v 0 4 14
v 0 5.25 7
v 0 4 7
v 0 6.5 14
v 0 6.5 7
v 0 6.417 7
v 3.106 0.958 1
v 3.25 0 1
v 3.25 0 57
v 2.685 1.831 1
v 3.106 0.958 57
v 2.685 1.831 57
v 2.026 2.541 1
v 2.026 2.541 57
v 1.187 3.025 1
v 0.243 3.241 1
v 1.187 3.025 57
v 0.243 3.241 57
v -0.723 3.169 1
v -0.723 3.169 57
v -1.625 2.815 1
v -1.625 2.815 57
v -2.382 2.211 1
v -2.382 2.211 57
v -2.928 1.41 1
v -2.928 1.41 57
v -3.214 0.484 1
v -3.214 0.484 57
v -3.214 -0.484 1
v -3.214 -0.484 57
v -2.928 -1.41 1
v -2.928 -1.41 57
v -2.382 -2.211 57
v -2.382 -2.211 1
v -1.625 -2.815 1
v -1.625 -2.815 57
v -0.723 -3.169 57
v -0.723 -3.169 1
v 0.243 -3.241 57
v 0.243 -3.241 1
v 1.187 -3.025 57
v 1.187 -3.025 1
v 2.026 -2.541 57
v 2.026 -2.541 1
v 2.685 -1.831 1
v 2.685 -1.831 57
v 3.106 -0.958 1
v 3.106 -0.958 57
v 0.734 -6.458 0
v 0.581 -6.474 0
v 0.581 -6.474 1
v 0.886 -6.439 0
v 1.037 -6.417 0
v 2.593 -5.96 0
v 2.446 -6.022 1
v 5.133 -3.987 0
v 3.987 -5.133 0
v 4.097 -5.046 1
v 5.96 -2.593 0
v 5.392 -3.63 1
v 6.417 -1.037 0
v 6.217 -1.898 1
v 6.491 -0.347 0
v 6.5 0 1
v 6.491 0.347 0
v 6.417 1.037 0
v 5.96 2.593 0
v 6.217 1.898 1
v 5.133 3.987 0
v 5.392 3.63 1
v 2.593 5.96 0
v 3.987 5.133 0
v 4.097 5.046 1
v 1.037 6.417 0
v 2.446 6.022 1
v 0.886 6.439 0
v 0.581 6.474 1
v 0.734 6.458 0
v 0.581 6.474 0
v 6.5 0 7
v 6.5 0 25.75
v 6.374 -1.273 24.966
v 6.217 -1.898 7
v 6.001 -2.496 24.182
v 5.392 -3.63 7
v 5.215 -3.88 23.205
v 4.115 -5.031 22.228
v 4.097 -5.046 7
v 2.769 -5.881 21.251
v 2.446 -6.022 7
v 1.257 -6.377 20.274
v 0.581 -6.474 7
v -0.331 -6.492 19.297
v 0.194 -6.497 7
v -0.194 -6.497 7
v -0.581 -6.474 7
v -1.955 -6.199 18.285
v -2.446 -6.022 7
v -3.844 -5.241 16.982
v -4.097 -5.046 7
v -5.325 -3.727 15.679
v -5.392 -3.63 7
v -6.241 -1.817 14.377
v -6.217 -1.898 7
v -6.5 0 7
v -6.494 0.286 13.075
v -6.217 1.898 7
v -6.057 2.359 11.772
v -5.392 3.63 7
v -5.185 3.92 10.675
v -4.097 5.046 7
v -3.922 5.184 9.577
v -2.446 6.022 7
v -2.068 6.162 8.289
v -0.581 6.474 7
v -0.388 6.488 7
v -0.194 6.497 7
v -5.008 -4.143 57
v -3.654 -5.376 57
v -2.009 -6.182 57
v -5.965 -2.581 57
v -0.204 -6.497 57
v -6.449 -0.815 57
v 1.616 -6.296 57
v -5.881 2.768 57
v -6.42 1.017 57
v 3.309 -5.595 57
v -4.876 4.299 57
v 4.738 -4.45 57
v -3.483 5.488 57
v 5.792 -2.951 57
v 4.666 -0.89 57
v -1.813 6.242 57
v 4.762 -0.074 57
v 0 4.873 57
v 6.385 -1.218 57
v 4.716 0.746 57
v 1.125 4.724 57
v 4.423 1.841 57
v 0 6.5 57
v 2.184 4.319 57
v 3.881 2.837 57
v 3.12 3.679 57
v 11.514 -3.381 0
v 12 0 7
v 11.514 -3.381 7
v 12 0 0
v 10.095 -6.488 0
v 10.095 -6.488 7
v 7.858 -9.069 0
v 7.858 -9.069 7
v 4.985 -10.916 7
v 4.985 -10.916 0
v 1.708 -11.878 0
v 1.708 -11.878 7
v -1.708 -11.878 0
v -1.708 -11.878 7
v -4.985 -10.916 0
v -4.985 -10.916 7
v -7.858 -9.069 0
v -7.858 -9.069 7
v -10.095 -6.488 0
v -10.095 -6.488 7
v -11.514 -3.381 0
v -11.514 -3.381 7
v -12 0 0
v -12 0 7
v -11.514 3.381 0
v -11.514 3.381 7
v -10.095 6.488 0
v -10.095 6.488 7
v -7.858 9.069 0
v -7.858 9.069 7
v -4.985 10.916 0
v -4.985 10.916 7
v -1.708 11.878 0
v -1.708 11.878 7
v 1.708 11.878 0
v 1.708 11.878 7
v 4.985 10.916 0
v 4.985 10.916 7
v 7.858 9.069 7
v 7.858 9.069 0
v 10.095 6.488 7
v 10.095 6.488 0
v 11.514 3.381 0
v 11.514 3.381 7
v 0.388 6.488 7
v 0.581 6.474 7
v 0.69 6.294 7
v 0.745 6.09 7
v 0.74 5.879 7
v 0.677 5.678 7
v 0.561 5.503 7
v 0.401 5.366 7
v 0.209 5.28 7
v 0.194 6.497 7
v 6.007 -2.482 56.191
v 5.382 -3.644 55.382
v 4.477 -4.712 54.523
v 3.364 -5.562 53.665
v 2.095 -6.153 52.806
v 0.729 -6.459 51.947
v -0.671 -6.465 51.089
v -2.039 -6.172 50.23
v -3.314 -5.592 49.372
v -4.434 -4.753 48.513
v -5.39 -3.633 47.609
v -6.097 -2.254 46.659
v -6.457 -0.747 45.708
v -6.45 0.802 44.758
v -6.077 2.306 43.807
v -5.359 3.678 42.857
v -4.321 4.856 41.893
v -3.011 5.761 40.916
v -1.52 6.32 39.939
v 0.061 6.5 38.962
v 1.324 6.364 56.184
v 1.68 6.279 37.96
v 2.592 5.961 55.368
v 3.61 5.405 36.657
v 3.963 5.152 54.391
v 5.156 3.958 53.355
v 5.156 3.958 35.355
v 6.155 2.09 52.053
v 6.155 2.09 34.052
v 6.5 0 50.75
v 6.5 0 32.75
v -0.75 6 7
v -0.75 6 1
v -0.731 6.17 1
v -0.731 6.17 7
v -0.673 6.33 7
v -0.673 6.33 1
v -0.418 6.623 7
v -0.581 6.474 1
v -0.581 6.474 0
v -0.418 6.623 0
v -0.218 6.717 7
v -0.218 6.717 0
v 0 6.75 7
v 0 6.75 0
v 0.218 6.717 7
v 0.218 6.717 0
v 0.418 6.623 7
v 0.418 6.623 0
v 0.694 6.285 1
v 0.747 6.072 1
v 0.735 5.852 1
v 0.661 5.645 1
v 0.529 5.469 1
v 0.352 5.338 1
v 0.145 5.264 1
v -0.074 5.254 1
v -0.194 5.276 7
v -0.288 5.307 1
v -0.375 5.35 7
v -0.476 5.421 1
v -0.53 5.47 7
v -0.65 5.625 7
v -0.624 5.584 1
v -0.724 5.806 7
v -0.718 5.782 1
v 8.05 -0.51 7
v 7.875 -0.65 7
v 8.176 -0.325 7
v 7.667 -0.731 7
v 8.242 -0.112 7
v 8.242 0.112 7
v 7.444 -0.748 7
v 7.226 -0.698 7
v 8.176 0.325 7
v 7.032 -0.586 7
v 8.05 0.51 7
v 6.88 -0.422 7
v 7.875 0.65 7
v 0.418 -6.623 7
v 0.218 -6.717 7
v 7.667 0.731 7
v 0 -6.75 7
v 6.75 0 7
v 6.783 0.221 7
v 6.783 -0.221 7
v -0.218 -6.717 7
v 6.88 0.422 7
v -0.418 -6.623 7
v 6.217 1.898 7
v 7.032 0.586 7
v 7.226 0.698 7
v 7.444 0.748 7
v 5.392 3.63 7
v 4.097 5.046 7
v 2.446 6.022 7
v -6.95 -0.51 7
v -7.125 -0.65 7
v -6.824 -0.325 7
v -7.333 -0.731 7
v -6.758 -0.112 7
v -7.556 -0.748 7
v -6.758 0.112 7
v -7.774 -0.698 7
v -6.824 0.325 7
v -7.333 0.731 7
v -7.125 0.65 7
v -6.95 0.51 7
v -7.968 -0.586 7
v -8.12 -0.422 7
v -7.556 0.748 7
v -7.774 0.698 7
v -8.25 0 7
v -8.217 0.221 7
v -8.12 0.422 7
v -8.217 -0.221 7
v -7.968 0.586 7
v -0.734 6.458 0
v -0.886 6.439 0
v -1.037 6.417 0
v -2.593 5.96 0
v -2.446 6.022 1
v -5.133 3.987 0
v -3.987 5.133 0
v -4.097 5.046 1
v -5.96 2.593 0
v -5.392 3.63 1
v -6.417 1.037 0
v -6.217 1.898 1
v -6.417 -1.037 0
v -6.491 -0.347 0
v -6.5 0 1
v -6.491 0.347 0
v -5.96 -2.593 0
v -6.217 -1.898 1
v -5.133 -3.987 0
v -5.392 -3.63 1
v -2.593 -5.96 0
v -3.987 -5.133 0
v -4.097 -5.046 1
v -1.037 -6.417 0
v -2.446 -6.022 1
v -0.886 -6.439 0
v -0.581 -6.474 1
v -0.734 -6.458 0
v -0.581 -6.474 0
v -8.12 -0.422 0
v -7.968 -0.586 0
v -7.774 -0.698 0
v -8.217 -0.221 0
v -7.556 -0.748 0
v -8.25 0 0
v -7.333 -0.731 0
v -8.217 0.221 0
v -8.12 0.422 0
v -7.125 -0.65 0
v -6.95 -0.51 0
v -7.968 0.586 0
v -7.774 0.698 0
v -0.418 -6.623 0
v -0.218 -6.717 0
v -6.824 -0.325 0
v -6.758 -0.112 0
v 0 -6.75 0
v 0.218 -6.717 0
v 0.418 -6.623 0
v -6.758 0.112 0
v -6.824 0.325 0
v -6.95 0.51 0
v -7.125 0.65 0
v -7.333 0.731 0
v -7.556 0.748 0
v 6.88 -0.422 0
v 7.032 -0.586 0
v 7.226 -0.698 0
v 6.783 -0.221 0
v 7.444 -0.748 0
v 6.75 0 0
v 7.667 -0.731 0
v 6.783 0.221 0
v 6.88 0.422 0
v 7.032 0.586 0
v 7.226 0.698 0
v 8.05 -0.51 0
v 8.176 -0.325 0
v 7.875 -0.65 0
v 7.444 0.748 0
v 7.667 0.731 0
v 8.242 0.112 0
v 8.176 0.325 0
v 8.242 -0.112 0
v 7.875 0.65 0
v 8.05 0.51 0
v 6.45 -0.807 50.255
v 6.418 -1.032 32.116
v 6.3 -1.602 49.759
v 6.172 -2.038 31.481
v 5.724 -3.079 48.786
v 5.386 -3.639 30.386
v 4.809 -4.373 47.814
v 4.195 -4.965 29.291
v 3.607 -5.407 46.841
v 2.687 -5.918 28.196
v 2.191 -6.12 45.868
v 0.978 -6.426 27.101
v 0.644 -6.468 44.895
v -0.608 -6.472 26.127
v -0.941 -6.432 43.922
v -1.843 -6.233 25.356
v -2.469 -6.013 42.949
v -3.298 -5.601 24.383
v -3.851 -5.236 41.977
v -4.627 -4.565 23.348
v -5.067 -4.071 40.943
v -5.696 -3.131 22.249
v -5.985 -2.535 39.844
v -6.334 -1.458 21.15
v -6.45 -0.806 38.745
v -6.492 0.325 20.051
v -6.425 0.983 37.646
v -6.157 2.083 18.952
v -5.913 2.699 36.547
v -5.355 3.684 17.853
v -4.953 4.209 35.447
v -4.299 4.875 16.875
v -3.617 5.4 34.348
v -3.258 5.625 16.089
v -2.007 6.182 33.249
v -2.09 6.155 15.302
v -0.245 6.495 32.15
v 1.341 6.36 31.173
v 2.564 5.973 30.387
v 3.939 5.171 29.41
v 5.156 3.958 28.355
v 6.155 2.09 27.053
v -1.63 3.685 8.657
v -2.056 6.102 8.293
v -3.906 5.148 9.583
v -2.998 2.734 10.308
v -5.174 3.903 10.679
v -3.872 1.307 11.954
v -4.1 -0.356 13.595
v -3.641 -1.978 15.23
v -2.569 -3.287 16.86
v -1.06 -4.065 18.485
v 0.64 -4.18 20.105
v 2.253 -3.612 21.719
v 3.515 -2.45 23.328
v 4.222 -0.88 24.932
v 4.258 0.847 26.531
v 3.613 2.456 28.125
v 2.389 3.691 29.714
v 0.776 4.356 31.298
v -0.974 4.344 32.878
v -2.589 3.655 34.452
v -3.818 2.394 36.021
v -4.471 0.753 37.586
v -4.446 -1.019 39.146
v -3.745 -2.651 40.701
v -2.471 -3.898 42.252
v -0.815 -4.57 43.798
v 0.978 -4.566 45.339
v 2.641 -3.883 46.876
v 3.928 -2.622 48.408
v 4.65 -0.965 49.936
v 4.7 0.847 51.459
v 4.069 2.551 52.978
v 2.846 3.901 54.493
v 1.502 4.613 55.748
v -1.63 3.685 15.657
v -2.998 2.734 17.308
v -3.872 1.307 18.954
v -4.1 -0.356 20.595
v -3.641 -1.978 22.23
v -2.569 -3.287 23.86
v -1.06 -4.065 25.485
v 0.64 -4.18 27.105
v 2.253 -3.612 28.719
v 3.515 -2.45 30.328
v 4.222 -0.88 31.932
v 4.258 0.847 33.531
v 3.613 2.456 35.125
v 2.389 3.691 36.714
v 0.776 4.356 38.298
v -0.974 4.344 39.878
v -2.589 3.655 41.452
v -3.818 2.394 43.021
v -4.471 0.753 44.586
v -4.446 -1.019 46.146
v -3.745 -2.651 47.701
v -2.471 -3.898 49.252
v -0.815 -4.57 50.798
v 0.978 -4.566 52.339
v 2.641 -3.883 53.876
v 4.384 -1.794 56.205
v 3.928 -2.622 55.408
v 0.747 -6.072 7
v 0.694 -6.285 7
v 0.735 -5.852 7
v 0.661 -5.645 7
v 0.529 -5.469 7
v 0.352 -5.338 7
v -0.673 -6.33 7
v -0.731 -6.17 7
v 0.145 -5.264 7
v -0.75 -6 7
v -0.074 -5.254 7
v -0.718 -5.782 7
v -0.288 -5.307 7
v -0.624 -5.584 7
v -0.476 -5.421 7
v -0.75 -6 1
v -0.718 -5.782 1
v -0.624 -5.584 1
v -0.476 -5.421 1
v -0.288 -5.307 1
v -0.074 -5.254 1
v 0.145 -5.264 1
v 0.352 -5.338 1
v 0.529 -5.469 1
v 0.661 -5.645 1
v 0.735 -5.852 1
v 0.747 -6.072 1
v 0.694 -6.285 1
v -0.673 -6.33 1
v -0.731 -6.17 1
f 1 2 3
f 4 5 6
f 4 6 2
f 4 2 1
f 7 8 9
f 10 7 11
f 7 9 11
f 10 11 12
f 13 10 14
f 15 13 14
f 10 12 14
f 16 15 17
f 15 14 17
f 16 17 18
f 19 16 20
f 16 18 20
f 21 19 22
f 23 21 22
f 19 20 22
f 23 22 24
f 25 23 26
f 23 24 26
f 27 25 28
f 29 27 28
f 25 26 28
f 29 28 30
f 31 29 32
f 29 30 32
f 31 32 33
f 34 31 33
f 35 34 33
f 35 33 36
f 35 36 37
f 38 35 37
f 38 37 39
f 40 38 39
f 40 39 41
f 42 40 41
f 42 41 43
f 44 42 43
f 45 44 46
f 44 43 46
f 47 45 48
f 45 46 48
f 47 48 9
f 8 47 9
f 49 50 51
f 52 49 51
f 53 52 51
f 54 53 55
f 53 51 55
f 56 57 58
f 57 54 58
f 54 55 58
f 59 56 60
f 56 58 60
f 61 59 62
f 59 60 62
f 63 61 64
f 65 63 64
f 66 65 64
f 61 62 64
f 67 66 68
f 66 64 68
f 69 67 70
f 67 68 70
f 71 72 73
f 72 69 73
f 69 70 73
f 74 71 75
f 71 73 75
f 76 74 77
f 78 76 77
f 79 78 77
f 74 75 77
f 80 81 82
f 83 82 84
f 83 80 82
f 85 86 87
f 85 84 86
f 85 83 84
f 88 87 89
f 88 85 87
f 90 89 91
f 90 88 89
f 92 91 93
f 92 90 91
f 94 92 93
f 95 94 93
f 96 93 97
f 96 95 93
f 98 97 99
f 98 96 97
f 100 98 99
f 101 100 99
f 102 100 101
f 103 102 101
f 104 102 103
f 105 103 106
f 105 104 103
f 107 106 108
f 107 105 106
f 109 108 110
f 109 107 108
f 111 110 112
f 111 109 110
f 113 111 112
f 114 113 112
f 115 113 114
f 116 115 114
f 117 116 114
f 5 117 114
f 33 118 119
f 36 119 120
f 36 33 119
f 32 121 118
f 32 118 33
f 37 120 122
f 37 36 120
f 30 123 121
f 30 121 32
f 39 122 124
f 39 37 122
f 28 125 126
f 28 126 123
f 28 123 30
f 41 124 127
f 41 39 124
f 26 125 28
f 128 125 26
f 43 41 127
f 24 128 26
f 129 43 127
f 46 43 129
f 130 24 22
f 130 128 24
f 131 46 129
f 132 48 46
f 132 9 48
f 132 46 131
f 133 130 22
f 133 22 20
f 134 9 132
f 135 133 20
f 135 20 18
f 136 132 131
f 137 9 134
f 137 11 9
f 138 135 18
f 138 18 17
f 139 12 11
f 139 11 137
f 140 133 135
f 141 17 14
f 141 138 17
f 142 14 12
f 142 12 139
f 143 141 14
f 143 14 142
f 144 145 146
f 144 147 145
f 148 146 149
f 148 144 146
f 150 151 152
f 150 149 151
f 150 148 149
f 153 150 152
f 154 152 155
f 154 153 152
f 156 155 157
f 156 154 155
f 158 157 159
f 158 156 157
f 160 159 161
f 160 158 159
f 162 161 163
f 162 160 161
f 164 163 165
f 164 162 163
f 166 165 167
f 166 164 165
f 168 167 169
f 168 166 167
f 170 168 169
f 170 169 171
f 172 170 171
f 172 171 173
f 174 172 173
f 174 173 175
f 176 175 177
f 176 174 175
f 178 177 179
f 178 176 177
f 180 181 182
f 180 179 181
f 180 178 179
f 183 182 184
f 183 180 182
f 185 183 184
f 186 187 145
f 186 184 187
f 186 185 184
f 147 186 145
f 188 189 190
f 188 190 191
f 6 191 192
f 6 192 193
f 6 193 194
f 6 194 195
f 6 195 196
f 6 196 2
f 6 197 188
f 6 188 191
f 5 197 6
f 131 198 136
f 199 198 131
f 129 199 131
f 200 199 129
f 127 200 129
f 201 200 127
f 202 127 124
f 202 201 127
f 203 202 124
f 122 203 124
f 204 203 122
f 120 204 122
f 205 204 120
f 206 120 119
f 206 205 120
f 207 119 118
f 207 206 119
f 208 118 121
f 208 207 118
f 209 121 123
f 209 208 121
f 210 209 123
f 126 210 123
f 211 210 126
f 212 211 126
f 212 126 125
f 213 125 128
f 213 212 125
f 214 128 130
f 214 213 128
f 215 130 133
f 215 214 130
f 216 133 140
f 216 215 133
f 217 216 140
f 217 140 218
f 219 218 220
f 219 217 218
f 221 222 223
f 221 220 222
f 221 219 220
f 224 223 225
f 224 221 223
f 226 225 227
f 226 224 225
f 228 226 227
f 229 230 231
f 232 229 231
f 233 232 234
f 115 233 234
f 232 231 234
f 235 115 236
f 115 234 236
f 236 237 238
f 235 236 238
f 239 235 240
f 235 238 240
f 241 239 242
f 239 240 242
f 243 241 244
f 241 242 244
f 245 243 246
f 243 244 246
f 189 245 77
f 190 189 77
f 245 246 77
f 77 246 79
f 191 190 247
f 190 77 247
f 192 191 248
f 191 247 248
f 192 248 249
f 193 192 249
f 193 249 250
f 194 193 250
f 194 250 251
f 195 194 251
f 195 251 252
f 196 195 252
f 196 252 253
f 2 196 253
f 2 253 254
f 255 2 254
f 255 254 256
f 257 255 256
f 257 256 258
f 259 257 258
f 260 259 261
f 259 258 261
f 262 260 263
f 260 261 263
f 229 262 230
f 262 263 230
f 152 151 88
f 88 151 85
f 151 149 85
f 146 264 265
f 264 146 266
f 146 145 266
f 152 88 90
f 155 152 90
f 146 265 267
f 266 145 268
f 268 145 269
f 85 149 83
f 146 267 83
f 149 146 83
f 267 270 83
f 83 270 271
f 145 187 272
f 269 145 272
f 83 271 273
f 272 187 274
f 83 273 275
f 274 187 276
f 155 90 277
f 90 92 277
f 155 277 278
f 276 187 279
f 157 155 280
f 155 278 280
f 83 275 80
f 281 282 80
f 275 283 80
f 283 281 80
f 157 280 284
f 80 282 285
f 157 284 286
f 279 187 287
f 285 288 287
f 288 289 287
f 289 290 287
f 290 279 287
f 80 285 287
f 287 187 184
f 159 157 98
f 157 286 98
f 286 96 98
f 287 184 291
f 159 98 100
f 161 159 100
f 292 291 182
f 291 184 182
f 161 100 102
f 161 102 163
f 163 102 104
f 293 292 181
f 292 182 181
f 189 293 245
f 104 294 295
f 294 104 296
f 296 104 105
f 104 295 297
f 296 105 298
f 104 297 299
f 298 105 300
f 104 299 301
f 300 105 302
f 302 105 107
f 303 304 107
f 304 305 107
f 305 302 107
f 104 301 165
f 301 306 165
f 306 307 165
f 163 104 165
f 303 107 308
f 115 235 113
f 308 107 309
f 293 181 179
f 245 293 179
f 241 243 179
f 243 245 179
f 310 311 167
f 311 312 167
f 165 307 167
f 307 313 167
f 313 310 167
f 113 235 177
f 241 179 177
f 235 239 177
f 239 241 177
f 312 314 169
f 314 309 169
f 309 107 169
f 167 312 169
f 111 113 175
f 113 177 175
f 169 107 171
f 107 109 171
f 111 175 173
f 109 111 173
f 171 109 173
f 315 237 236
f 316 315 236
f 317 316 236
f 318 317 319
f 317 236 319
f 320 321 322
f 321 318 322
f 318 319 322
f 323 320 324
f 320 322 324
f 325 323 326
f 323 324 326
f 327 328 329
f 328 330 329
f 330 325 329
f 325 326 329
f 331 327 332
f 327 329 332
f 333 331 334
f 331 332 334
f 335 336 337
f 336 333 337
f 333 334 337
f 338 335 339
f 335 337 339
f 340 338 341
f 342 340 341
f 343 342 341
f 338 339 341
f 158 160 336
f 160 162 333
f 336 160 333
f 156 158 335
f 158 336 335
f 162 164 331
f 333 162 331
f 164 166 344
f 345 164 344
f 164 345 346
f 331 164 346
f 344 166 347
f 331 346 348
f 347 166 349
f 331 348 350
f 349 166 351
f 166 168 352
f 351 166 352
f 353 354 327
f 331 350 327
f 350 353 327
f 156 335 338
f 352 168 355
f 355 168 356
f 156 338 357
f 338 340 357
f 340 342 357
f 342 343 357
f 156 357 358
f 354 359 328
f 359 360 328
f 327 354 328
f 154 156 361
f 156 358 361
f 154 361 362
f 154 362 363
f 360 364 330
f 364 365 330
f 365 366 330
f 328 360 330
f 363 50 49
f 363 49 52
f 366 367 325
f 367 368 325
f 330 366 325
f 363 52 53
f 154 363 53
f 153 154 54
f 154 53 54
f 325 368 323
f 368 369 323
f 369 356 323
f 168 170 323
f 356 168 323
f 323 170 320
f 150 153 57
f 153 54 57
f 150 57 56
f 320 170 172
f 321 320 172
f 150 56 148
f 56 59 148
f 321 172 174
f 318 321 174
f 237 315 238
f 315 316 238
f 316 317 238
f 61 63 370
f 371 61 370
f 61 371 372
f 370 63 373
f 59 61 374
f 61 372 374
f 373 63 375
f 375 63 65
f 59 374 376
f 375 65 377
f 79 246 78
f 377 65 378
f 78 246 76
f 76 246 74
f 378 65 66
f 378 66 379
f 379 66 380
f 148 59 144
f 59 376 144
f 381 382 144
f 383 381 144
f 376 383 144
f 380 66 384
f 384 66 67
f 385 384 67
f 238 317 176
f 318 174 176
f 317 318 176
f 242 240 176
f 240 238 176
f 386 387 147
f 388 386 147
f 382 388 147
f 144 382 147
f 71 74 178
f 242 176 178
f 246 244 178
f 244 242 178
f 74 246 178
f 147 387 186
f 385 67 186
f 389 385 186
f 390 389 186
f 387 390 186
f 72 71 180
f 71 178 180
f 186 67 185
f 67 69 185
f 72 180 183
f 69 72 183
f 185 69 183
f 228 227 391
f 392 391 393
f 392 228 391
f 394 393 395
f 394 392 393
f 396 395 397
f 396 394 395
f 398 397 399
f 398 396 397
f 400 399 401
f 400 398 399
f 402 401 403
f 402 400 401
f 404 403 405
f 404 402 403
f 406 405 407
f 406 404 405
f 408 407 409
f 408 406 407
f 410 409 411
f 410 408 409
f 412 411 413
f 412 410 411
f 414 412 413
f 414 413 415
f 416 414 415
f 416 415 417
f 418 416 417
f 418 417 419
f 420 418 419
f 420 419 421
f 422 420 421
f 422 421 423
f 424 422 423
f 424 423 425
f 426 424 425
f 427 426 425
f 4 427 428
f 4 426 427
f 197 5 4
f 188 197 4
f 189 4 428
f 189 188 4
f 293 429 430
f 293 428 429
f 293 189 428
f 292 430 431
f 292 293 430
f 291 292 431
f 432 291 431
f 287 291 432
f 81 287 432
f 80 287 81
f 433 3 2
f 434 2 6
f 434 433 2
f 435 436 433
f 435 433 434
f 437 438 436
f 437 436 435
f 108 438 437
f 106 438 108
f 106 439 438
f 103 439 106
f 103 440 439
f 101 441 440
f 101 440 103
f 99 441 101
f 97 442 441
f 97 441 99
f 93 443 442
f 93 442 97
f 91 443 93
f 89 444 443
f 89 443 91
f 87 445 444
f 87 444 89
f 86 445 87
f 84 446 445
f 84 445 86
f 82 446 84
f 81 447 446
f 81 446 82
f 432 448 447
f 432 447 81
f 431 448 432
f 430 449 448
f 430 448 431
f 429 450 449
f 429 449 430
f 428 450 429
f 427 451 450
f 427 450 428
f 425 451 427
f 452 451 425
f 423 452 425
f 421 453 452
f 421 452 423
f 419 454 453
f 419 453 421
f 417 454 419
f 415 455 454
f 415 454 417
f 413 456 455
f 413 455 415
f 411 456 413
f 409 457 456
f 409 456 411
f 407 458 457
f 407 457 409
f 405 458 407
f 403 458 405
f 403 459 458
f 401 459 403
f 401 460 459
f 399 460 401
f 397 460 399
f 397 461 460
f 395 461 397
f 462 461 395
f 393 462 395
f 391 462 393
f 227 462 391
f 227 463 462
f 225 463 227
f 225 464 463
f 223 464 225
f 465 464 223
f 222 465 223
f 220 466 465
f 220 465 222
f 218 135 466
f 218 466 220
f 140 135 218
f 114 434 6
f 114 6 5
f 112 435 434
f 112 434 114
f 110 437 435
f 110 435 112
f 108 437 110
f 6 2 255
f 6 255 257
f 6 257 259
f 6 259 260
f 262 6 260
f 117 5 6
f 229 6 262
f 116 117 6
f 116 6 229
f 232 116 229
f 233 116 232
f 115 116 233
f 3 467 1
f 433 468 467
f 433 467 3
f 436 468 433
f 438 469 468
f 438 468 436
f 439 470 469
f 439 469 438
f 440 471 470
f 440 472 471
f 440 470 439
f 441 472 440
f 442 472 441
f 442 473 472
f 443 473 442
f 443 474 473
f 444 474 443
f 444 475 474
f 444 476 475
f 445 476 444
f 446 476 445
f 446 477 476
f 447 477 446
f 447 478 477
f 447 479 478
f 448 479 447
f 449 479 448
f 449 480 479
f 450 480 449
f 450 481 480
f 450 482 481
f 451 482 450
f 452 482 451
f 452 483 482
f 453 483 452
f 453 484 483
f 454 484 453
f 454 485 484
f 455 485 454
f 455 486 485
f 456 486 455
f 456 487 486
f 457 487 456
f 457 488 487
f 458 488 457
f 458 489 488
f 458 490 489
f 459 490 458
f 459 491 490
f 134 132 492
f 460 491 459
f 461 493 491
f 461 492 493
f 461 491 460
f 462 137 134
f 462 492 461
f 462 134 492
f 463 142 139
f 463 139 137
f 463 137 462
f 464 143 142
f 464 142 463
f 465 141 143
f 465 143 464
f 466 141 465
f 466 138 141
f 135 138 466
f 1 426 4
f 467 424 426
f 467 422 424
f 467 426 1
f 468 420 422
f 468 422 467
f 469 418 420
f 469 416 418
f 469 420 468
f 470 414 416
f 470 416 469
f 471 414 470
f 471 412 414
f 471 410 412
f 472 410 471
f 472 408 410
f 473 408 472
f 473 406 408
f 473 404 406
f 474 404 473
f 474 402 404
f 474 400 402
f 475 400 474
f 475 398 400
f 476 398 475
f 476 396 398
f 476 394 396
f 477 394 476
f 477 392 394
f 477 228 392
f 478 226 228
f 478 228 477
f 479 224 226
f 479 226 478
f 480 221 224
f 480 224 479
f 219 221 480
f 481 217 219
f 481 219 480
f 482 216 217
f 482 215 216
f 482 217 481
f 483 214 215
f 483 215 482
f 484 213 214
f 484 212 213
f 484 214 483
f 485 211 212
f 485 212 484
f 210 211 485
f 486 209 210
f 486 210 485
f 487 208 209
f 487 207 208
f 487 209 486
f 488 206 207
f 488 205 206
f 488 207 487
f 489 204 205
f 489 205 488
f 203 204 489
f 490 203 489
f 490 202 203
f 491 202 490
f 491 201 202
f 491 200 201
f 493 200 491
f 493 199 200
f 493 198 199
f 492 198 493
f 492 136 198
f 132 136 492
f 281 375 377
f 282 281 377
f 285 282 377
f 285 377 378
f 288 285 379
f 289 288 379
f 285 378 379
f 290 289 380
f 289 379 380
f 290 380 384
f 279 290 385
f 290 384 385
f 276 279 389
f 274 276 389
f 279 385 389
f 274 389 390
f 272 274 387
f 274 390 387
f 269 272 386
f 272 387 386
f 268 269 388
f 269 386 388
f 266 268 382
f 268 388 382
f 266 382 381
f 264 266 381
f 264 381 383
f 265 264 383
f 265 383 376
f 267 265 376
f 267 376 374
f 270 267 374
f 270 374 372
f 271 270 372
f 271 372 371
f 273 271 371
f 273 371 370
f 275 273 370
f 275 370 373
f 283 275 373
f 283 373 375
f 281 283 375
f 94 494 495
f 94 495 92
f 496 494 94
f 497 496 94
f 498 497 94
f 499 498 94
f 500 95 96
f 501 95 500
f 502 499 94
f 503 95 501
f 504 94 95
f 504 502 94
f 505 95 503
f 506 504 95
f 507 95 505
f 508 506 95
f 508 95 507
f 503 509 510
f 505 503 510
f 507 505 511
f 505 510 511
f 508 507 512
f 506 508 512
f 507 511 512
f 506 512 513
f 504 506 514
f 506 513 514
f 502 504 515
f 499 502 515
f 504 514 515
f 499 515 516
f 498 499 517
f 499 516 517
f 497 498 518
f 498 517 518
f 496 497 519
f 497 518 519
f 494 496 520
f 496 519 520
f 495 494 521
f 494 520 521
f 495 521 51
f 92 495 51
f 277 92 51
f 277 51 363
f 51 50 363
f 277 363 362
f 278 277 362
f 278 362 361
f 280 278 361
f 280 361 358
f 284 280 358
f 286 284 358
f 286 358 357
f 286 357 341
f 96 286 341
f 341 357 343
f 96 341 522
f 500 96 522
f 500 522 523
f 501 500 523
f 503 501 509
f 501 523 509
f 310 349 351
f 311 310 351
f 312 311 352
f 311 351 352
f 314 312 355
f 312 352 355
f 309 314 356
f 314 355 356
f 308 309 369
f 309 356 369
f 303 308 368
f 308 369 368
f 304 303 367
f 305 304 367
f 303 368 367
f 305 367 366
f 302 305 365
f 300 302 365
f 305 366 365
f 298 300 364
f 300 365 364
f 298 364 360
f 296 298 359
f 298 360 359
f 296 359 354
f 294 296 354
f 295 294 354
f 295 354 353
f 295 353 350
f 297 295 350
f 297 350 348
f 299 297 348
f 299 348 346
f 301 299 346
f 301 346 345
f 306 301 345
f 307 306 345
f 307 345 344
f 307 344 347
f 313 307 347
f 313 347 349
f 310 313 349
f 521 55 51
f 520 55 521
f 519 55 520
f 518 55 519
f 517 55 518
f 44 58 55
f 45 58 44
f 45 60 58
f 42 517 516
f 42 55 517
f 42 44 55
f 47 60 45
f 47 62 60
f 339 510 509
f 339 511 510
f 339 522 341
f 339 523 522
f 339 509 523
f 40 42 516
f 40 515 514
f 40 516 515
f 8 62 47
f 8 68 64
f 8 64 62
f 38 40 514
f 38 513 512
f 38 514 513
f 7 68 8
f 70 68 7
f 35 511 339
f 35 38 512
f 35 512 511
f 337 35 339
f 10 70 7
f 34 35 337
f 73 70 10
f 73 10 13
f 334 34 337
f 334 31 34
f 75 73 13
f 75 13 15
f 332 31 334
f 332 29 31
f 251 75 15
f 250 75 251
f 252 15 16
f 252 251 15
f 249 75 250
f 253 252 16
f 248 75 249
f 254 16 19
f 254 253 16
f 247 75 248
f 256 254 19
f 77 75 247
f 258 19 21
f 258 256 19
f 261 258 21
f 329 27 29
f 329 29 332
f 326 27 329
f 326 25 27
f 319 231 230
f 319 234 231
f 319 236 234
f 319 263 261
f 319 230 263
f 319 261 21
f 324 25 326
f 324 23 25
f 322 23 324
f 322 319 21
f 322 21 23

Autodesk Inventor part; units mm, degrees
ref_plane "YZ Plane" through (0, 0, 0) normal (1, 0, 0) x (0, 1, 0)
ref_plane "XY Plane" through (0, 0, 0) normal (0, 0, 1) x (1, 0, 0)
sketch "Sketch1" plane through (0, 0, 0) normal (0, 0, 1) x (1, 0, 0)
  line L0 (0, 0) -> (0, 7.5)
  circle A0 centre (0, 7.5) radius 1.5
  circle A1 centre (-5.3033, 5.3033) radius 1.5
  circle A2 centre (-7.5, 0) radius 1.5
  circle A3 centre (-5.3033, -5.3033) radius 1.5
  circle A4 centre (0, -7.5) radius 1.5
  circle A5 centre (5.3033, -5.3033) radius 1.5
  circle A6 centre (7.5, 0) radius 1.5
  circle A7 centre (5.3033, 5.3033) radius 1.5
  circle A8 centre (0, 0) radius 12
  dimension "d0" = 7.5
  dimension "d1" = 3
  dimension "d4" = 360
  dimension "d6" = 24
extrude "Extrusion1" add sketch "Sketch1" along normal blind 7 contours A1 | A3 | A5 | A7 | A8
sketch "Sketch2" plane through (0, 0, 0) normal (0, 0, -1) x (-1, 0, 0)
  circle A0 centre (0, 0) radius 6.5
  dimension "d9" = 13
extrude "Extrusion2" cut sketch "Sketch2" against normal blind 1
sketch "Sketch3" plane through (0, 0, 7) normal (0, 0, 1) x (1, 0, 0)
  circle A0 centre (0, 0) radius 6.5
  dimension "d12" = 13
extrude "Extrusion3" add sketch "Sketch3" along normal blind 50
sketch "Sketch5" plane through (0, 0, 57) normal (0, 0, 1) x (1, 0, 0)
  circle A0 centre (0, 0) radius 3.25
  dimension "d25" = 6.5
extrude "Extrusion5" cut sketch "Sketch5" against normal up to surface (56 mm away)
ref_plane "Work Plane1" through (0, 12, 0) normal (0, 1, 0) x (-1, 0, 0)
sketch "Sketch8" plane through (0, 0, 7) normal (0, 0, 1) x (1, 0, 0)
  circle A0 centre (0, 0) radius 3
  dimension "d44" = 6
extrude "Extrusion8" cut sketch "Sketch8" against normal through all
sketch "Sketch9" plane through (0, 0, 0) normal (1, 0, 0) x (0, 1, 0)
  line L0 (6.5, 7) -> (6.5, 57) projected
  line L1 (6.5, 7) -> (6.5, 57) projected
  line L2 (6.4167, 7) -> (9, 7) projected
  line L3 (9, 7) -> (4, 7)
  line L4 (4, 7) -> (4, 14)
  line L5 (4, 14) -> (9, 14)
  line L6 (9, 14) -> (9, 7)
  line L7 (0, -11.4) -> (0, 68.4) projected
  point P0 (0, 0)
  dimension "d61" = 5
  dimension "d62" = 7
coil "Coil2" sketch "Sketch9" operation cut axis through (0, 0, 7) along (0, 0, 1) pitch 25 turns 2 hand right taper 1
sketch "Boceto13" plane through (0, 0, 0) normal (0, 0, -1) x (-1, 0, 0)
  arc A0 (-6.4167, 1.0375) -> (-6.4167, -1.0375) centre (-7.5, 0) ccw projected
  circle A1 centre (-7.5, 0) radius 1.5
  arc A2 (-1.0375, -6.4167) -> (1.0375, -6.4167) centre (0, -7.5) ccw projected
  circle A3 centre (0, -7.5) radius 1.5
  arc A4 (1.0375, 6.4167) -> (-1.0375, 6.4167) centre (0, 7.5) ccw projected
  circle A5 centre (0, 7.5) radius 1.5
  arc A6 (6.4167, -1.0375) -> (6.4167, 1.0375) centre (7.5, 0) ccw projected
  circle A7 centre (7.5, 0) radius 1.5
  point P0 (0, 0)
extrude "Extrusión9" add sketch "Boceto13" against normal blind 7
sketch "Boceto14" plane through (0, 0, 1) normal (0, 0, -1) x (-1, 0, 0)
  circle A0 centre (0, 0) radius 6.5
extrude "Extrusión10" cut sketch "Boceto14" along normal blind 2
sketch "Boceto15" plane through (0, 0, 0) normal (0, 0, -1) x (-1, 0, 0)
  line L0 (0, 0) -> (-7.5, 0)
  line L1 (0, 0) -> (7.5, 0)
  line L2 (0, 0) -> (0, 6)
  line L3 (0, 0) -> (0, -6)
  circle A0 centre (0, 6) radius 0.75
  circle A1 centre (-7.5, 0) radius 0.75
  circle A2 centre (0, -6) radius 0.75
  circle A3 centre (7.5, 0) radius 0.75
  dimension "d76" = 7.5
  dimension "d77" = 7.5
  dimension "d78" = 6
  dimension "d79" = 6
  dimension "d80" = 1.5
  dimension "d81" = 1.5
  dimension "d82" = 1.5
  dimension "d83" = 1.5
extrude "Extrusión11" cut sketch "Boceto15" against normal blind 7
properties part number "ScrewActuatorGripper"
